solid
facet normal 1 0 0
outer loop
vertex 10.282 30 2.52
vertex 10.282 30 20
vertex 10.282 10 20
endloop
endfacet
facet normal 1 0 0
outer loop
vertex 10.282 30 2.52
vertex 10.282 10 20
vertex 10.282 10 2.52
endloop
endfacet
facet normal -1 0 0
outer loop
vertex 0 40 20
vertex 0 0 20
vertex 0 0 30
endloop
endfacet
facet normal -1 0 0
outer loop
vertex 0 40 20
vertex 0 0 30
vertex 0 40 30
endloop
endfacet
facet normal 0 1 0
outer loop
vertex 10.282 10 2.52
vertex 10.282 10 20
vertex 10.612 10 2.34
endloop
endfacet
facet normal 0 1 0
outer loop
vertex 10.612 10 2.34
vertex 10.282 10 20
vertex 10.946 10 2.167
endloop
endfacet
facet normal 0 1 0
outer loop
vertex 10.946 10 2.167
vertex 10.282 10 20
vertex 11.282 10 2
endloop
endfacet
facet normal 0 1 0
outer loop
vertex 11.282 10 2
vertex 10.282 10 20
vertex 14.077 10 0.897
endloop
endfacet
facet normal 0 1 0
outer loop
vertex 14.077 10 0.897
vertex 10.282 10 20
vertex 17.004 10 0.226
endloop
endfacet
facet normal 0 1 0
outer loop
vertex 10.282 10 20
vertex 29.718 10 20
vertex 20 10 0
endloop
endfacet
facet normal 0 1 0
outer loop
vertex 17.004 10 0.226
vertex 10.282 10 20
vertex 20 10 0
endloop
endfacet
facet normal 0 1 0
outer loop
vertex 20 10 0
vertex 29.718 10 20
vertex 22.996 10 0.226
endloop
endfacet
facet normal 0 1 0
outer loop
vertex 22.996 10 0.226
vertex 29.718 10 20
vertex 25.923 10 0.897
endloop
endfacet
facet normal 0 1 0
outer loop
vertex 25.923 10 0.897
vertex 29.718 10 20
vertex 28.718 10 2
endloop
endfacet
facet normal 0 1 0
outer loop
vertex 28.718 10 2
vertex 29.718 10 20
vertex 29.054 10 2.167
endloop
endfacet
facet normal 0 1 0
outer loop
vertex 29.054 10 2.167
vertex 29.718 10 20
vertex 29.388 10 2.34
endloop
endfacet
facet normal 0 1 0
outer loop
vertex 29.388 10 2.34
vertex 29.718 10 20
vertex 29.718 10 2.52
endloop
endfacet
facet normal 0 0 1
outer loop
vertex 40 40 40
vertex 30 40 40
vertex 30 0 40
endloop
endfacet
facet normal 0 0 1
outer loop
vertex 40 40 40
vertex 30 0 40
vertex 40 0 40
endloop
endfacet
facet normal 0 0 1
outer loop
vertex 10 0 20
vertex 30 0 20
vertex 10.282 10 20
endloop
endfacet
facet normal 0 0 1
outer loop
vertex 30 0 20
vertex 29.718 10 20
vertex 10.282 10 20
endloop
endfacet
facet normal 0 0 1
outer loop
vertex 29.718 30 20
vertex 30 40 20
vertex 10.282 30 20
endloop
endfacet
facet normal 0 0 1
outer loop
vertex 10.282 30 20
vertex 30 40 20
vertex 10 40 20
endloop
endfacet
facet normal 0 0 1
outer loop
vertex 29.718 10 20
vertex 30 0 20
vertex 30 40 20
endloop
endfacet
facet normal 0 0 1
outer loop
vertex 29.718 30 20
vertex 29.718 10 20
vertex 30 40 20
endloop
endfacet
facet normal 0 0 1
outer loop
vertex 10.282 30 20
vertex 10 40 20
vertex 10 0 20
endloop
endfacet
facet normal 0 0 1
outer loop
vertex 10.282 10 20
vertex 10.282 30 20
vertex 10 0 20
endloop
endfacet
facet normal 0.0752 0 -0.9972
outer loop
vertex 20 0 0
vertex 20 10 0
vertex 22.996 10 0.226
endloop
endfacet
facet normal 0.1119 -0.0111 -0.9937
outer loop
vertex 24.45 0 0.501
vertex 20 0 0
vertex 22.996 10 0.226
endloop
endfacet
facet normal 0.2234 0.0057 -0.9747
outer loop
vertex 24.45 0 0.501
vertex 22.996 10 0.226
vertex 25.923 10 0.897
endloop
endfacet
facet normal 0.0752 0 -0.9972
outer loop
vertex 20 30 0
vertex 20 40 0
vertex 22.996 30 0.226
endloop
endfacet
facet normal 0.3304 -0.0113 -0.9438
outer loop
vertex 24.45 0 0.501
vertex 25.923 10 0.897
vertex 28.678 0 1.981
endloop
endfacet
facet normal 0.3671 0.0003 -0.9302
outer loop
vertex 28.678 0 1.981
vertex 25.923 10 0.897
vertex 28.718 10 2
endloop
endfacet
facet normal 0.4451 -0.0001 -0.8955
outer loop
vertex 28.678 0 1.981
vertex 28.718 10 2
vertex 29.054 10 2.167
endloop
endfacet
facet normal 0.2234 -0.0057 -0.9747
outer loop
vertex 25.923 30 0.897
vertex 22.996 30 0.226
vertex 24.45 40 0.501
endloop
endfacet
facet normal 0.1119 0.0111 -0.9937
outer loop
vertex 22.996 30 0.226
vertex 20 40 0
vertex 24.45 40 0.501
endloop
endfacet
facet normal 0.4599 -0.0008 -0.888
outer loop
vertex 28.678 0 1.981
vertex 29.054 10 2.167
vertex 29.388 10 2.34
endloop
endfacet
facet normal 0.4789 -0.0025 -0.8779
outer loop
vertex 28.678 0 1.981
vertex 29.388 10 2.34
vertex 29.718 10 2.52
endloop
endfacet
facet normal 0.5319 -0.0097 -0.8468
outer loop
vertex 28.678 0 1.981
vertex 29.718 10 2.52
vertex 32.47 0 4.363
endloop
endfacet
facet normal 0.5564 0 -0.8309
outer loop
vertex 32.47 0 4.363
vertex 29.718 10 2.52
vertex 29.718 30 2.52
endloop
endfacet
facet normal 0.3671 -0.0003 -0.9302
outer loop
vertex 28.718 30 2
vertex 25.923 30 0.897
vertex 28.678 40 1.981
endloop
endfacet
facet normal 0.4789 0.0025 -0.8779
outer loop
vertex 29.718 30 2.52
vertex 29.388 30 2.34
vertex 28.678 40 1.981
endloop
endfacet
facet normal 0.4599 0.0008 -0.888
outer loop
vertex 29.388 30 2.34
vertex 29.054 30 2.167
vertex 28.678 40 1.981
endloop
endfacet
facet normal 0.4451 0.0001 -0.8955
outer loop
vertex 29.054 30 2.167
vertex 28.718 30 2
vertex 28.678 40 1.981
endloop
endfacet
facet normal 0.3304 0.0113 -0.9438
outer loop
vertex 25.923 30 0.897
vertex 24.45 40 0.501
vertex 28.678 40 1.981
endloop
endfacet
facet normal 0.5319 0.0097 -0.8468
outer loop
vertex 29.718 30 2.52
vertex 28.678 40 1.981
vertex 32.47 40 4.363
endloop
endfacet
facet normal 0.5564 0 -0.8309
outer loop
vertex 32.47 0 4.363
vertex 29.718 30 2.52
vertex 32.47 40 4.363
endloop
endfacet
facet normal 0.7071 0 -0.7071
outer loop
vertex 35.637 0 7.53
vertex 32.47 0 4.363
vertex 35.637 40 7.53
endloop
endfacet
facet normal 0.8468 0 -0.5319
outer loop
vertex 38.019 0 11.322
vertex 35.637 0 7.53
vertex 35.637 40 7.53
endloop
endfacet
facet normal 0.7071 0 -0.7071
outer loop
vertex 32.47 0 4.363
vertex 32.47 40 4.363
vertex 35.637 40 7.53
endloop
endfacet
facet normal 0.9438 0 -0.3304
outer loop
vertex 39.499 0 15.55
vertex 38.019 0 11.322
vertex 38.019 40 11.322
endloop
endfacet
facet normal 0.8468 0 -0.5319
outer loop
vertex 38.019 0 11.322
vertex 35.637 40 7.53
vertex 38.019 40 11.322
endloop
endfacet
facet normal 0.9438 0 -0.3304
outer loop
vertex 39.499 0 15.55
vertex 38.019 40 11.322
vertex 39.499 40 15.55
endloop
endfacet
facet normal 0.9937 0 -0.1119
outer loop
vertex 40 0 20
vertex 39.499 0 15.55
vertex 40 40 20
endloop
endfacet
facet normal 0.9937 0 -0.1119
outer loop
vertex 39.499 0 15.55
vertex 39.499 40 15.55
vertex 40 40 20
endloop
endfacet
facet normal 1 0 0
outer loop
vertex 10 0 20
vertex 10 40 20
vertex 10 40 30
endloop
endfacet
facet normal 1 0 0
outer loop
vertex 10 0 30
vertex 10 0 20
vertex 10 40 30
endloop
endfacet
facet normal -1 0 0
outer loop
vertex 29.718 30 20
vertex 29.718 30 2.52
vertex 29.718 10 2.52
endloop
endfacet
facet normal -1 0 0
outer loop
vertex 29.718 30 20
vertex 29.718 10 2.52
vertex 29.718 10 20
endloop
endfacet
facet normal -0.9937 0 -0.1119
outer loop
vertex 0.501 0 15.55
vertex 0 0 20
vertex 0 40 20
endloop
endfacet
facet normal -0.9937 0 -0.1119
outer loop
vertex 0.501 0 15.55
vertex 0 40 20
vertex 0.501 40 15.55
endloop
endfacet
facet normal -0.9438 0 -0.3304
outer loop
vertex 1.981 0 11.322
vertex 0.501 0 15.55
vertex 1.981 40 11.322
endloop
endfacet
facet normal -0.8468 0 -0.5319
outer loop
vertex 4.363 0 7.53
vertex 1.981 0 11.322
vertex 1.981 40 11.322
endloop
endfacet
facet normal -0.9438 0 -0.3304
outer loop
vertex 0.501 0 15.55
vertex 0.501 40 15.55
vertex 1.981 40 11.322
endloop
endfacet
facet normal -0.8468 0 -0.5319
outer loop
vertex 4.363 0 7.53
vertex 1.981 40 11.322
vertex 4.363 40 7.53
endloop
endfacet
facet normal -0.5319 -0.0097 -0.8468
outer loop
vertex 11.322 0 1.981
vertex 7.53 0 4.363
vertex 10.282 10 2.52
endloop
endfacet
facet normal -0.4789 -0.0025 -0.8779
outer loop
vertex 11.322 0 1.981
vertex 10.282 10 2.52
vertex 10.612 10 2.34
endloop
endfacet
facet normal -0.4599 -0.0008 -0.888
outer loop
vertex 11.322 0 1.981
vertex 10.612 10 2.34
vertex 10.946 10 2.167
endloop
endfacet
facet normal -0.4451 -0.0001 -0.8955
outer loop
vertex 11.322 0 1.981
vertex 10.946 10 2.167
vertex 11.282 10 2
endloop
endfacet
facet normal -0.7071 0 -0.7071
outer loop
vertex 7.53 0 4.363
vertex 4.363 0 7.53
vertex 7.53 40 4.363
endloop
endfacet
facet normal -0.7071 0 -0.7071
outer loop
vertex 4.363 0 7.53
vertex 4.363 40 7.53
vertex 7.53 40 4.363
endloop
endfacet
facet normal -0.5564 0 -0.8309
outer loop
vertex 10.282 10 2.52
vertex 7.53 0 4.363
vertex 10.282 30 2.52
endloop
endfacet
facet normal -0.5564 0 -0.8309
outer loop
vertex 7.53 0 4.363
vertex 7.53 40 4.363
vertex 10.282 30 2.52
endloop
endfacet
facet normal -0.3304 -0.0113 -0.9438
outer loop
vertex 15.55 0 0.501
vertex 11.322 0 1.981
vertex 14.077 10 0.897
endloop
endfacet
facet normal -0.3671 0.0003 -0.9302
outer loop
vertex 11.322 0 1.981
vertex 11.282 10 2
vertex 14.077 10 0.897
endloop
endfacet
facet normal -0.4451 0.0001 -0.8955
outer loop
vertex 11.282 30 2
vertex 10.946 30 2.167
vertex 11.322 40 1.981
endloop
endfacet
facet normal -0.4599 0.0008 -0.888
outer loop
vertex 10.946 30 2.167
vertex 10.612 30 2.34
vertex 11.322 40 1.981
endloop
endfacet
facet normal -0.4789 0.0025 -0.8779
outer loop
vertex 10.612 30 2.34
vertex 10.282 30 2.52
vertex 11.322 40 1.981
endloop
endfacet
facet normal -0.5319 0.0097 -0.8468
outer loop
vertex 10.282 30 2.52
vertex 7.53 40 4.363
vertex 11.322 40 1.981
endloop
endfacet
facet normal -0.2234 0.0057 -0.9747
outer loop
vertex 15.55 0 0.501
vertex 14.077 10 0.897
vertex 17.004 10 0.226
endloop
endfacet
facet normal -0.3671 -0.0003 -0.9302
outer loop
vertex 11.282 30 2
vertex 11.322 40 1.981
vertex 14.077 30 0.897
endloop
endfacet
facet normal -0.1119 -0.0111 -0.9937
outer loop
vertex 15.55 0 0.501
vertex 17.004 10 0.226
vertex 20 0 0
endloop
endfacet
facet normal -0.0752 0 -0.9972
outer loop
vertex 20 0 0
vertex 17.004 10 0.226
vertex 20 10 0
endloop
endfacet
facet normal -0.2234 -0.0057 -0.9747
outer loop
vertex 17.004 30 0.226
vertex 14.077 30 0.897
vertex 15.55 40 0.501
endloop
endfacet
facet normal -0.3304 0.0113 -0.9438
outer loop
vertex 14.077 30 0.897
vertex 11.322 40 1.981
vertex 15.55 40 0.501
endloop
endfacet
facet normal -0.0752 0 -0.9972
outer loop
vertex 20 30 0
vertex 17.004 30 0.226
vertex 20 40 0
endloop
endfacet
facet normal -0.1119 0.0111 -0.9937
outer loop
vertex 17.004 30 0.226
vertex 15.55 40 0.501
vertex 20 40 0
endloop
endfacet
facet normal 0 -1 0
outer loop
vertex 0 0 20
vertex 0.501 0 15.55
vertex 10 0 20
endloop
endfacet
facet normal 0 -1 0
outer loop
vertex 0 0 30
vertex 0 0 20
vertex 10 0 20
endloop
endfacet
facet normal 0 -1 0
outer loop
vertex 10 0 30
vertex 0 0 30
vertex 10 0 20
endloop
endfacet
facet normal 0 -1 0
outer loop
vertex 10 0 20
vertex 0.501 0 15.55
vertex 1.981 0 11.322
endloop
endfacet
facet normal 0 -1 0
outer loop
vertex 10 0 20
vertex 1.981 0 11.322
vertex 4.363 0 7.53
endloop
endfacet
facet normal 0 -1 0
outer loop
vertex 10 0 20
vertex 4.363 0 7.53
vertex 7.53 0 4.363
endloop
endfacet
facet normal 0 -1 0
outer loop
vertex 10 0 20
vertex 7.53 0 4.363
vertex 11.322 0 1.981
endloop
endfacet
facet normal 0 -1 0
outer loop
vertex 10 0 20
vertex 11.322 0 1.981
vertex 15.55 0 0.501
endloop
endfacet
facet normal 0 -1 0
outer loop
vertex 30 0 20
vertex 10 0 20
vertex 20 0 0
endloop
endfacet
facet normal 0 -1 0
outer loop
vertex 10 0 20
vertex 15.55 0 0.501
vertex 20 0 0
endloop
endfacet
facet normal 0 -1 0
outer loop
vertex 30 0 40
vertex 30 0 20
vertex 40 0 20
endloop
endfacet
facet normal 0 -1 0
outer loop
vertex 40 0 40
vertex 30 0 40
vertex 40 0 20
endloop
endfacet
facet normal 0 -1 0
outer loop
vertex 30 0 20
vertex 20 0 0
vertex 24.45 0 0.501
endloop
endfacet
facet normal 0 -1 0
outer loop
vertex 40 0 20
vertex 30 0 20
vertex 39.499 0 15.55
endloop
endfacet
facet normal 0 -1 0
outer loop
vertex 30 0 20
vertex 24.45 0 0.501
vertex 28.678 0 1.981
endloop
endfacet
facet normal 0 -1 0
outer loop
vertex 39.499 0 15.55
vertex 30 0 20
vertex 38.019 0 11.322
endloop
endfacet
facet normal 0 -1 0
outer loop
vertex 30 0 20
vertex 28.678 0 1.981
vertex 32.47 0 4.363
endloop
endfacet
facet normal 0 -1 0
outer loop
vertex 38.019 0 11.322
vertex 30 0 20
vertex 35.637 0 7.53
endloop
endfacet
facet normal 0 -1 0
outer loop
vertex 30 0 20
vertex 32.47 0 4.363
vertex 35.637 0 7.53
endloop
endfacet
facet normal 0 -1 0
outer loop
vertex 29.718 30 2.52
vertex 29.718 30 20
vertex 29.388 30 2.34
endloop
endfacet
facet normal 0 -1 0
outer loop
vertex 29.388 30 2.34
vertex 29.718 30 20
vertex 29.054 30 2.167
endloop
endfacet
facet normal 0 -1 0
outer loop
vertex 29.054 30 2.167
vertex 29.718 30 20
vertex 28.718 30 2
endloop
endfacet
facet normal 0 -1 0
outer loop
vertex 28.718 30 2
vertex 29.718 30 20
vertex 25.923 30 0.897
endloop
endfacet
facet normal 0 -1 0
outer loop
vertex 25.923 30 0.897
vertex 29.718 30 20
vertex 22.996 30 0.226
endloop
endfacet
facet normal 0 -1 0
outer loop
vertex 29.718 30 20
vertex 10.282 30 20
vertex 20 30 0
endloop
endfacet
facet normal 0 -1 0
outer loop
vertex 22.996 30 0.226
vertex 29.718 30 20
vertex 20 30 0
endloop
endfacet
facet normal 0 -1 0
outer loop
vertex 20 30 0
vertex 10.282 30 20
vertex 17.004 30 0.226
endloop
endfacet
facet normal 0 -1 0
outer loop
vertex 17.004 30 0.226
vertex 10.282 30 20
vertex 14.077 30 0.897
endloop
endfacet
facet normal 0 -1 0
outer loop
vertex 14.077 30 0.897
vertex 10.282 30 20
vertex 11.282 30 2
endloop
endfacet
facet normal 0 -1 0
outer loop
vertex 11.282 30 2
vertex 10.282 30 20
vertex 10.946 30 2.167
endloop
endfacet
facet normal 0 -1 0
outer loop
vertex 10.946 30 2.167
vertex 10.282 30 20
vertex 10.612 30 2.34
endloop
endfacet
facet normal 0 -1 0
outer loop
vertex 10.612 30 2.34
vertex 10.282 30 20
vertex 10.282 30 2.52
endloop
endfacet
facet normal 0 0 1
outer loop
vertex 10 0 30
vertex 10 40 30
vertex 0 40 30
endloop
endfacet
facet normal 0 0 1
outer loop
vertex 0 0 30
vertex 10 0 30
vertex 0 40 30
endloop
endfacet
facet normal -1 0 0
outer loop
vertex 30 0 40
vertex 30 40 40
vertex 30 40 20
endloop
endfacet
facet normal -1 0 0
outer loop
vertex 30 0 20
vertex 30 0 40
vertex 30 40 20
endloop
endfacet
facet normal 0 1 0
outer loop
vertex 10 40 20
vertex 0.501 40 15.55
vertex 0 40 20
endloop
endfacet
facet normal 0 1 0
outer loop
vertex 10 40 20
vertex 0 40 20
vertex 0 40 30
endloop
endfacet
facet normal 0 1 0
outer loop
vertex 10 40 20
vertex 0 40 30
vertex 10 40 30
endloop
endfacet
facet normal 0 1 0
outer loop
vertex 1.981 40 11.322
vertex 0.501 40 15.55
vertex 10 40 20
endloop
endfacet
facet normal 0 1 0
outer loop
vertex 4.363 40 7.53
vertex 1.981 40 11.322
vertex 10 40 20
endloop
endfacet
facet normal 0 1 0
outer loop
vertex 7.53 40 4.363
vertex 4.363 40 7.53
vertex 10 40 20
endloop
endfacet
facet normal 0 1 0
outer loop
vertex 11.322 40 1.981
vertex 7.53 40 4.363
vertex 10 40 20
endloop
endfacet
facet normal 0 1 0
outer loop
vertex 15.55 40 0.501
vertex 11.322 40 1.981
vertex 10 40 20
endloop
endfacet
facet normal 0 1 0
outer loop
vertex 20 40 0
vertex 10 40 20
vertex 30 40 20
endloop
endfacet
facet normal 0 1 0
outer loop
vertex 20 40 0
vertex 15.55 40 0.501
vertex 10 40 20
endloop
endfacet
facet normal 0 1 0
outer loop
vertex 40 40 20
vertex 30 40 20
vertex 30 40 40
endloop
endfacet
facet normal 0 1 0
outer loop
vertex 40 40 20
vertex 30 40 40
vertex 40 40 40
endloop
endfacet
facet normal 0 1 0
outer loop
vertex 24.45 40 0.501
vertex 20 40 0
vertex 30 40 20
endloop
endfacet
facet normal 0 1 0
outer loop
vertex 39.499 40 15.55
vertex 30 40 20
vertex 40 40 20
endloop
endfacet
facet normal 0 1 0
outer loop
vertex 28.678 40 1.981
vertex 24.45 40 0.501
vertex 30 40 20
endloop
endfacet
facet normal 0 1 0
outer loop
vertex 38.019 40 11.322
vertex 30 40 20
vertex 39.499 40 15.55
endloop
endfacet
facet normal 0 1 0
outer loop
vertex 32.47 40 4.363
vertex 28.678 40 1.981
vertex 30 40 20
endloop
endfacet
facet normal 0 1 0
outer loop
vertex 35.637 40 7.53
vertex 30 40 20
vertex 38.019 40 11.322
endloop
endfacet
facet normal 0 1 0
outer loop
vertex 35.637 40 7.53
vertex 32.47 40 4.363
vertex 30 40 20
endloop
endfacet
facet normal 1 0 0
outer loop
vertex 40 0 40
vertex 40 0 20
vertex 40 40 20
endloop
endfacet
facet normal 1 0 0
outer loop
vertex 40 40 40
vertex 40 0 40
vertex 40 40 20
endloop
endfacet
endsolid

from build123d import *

# Parameters (mm, degrees)
SKETCH1_W           = 40
SKETCH1_H           = 40
BOSS_EXTRUDE1_DEPTH = 40
CUT_EXTRUDE1_DEPTH  = 40
SKETCH3_W           = 2
SKETCH3_H           = 20
CUT_EXTRUDE2_DEPTH  = 40
CUT_EXTRUDE4_DEPTH  = 20
SKETCH9_W           = 18
SKETCH9_H           = 20
CUT_EXTRUDE7_DEPTH  = 1
SKETCH10_W          = 18
SKETCH10_H          = 20
CUT_EXTRUDE8_DEPTH  = 1


with BuildPart() as part:
    # Sketch1 → Boss-Extrude1 (new body)
    with BuildSketch(Plane.XY):
        with Locations((20, 20)):
            Rectangle(SKETCH1_W, SKETCH1_H)
    extrude(amount=BOSS_EXTRUDE1_DEPTH)

    # Sketch2 → Cut-Extrude1 (cut)
    with BuildSketch(Plane(origin=(0, 40, 0), x_dir=(1, 0, 0), z_dir=(0, 1, 0))):
        Polygon((10, -30), (0, -30), (0, -40), (30, -40), (30, -20), (10, -20), align=None)
        with BuildLine():
            Line((40, 0), (20, 0))
            ThreePointArc((20, 0), (34.142135624, -5.857864376), (40, -20))
            Line((40, -20), (40, 0))
        make_face()
        with BuildLine():
            Line((0, 0), (0, -20))
            ThreePointArc((0, -20), (5.857864376, -5.857864376), (20, 0))
            Line((20, 0), (0, 0))
        make_face()
    extrude(amount=-CUT_EXTRUDE1_DEPTH, mode=Mode.SUBTRACT)

    # Sketch3 → Cut-Extrude2 (cut)
    with BuildSketch(Plane(origin=(0, 0, 0), x_dir=(0, 0, -1), z_dir=(1, 0, 0))):
        with Locations((-1, 20)):
            Rectangle(SKETCH3_W, SKETCH3_H)
    extrude(amount=CUT_EXTRUDE2_DEPTH, mode=Mode.SUBTRACT)

    # Sketch5 → Cut-Extrude4 (cut)
    with BuildSketch(Plane(origin=(0, 30, 0), x_dir=(1, 0, 0), z_dir=(0, 1, 0))):
        with BuildLine():
            Line((28.717797887, -2), (28.717797887, -20))
            Line((28.717797887, -20), (11.282202113, -20))
            Line((11.282202113, -20), (11.282202113, -2))
            ThreePointArc((11.282202113, -2), (20, 0), (28.717797887, -2))
        make_face()
    extrude(amount=-CUT_EXTRUDE4_DEPTH, mode=Mode.SUBTRACT)

    # Sketch9 → Cut-Extrude7 (cut)
    with BuildSketch(Plane.ZY.offset(-28.717797887)):
        with Locations((11, 20)):
            Rectangle(SKETCH9_W, SKETCH9_H)
    extrude(amount=-CUT_EXTRUDE7_DEPTH, mode=Mode.SUBTRACT)

    # Sketch10 → Cut-Extrude8 (cut)
    with BuildSketch(Plane(origin=(11.282202113, 0, 0), x_dir=(0, 0, -1), z_dir=(1, 0, 0))):
        with Locations((-11, 20)):
            Rectangle(SKETCH10_W, SKETCH10_H)
    extrude(amount=-CUT_EXTRUDE8_DEPTH, mode=Mode.SUBTRACT)


solid = part.part
